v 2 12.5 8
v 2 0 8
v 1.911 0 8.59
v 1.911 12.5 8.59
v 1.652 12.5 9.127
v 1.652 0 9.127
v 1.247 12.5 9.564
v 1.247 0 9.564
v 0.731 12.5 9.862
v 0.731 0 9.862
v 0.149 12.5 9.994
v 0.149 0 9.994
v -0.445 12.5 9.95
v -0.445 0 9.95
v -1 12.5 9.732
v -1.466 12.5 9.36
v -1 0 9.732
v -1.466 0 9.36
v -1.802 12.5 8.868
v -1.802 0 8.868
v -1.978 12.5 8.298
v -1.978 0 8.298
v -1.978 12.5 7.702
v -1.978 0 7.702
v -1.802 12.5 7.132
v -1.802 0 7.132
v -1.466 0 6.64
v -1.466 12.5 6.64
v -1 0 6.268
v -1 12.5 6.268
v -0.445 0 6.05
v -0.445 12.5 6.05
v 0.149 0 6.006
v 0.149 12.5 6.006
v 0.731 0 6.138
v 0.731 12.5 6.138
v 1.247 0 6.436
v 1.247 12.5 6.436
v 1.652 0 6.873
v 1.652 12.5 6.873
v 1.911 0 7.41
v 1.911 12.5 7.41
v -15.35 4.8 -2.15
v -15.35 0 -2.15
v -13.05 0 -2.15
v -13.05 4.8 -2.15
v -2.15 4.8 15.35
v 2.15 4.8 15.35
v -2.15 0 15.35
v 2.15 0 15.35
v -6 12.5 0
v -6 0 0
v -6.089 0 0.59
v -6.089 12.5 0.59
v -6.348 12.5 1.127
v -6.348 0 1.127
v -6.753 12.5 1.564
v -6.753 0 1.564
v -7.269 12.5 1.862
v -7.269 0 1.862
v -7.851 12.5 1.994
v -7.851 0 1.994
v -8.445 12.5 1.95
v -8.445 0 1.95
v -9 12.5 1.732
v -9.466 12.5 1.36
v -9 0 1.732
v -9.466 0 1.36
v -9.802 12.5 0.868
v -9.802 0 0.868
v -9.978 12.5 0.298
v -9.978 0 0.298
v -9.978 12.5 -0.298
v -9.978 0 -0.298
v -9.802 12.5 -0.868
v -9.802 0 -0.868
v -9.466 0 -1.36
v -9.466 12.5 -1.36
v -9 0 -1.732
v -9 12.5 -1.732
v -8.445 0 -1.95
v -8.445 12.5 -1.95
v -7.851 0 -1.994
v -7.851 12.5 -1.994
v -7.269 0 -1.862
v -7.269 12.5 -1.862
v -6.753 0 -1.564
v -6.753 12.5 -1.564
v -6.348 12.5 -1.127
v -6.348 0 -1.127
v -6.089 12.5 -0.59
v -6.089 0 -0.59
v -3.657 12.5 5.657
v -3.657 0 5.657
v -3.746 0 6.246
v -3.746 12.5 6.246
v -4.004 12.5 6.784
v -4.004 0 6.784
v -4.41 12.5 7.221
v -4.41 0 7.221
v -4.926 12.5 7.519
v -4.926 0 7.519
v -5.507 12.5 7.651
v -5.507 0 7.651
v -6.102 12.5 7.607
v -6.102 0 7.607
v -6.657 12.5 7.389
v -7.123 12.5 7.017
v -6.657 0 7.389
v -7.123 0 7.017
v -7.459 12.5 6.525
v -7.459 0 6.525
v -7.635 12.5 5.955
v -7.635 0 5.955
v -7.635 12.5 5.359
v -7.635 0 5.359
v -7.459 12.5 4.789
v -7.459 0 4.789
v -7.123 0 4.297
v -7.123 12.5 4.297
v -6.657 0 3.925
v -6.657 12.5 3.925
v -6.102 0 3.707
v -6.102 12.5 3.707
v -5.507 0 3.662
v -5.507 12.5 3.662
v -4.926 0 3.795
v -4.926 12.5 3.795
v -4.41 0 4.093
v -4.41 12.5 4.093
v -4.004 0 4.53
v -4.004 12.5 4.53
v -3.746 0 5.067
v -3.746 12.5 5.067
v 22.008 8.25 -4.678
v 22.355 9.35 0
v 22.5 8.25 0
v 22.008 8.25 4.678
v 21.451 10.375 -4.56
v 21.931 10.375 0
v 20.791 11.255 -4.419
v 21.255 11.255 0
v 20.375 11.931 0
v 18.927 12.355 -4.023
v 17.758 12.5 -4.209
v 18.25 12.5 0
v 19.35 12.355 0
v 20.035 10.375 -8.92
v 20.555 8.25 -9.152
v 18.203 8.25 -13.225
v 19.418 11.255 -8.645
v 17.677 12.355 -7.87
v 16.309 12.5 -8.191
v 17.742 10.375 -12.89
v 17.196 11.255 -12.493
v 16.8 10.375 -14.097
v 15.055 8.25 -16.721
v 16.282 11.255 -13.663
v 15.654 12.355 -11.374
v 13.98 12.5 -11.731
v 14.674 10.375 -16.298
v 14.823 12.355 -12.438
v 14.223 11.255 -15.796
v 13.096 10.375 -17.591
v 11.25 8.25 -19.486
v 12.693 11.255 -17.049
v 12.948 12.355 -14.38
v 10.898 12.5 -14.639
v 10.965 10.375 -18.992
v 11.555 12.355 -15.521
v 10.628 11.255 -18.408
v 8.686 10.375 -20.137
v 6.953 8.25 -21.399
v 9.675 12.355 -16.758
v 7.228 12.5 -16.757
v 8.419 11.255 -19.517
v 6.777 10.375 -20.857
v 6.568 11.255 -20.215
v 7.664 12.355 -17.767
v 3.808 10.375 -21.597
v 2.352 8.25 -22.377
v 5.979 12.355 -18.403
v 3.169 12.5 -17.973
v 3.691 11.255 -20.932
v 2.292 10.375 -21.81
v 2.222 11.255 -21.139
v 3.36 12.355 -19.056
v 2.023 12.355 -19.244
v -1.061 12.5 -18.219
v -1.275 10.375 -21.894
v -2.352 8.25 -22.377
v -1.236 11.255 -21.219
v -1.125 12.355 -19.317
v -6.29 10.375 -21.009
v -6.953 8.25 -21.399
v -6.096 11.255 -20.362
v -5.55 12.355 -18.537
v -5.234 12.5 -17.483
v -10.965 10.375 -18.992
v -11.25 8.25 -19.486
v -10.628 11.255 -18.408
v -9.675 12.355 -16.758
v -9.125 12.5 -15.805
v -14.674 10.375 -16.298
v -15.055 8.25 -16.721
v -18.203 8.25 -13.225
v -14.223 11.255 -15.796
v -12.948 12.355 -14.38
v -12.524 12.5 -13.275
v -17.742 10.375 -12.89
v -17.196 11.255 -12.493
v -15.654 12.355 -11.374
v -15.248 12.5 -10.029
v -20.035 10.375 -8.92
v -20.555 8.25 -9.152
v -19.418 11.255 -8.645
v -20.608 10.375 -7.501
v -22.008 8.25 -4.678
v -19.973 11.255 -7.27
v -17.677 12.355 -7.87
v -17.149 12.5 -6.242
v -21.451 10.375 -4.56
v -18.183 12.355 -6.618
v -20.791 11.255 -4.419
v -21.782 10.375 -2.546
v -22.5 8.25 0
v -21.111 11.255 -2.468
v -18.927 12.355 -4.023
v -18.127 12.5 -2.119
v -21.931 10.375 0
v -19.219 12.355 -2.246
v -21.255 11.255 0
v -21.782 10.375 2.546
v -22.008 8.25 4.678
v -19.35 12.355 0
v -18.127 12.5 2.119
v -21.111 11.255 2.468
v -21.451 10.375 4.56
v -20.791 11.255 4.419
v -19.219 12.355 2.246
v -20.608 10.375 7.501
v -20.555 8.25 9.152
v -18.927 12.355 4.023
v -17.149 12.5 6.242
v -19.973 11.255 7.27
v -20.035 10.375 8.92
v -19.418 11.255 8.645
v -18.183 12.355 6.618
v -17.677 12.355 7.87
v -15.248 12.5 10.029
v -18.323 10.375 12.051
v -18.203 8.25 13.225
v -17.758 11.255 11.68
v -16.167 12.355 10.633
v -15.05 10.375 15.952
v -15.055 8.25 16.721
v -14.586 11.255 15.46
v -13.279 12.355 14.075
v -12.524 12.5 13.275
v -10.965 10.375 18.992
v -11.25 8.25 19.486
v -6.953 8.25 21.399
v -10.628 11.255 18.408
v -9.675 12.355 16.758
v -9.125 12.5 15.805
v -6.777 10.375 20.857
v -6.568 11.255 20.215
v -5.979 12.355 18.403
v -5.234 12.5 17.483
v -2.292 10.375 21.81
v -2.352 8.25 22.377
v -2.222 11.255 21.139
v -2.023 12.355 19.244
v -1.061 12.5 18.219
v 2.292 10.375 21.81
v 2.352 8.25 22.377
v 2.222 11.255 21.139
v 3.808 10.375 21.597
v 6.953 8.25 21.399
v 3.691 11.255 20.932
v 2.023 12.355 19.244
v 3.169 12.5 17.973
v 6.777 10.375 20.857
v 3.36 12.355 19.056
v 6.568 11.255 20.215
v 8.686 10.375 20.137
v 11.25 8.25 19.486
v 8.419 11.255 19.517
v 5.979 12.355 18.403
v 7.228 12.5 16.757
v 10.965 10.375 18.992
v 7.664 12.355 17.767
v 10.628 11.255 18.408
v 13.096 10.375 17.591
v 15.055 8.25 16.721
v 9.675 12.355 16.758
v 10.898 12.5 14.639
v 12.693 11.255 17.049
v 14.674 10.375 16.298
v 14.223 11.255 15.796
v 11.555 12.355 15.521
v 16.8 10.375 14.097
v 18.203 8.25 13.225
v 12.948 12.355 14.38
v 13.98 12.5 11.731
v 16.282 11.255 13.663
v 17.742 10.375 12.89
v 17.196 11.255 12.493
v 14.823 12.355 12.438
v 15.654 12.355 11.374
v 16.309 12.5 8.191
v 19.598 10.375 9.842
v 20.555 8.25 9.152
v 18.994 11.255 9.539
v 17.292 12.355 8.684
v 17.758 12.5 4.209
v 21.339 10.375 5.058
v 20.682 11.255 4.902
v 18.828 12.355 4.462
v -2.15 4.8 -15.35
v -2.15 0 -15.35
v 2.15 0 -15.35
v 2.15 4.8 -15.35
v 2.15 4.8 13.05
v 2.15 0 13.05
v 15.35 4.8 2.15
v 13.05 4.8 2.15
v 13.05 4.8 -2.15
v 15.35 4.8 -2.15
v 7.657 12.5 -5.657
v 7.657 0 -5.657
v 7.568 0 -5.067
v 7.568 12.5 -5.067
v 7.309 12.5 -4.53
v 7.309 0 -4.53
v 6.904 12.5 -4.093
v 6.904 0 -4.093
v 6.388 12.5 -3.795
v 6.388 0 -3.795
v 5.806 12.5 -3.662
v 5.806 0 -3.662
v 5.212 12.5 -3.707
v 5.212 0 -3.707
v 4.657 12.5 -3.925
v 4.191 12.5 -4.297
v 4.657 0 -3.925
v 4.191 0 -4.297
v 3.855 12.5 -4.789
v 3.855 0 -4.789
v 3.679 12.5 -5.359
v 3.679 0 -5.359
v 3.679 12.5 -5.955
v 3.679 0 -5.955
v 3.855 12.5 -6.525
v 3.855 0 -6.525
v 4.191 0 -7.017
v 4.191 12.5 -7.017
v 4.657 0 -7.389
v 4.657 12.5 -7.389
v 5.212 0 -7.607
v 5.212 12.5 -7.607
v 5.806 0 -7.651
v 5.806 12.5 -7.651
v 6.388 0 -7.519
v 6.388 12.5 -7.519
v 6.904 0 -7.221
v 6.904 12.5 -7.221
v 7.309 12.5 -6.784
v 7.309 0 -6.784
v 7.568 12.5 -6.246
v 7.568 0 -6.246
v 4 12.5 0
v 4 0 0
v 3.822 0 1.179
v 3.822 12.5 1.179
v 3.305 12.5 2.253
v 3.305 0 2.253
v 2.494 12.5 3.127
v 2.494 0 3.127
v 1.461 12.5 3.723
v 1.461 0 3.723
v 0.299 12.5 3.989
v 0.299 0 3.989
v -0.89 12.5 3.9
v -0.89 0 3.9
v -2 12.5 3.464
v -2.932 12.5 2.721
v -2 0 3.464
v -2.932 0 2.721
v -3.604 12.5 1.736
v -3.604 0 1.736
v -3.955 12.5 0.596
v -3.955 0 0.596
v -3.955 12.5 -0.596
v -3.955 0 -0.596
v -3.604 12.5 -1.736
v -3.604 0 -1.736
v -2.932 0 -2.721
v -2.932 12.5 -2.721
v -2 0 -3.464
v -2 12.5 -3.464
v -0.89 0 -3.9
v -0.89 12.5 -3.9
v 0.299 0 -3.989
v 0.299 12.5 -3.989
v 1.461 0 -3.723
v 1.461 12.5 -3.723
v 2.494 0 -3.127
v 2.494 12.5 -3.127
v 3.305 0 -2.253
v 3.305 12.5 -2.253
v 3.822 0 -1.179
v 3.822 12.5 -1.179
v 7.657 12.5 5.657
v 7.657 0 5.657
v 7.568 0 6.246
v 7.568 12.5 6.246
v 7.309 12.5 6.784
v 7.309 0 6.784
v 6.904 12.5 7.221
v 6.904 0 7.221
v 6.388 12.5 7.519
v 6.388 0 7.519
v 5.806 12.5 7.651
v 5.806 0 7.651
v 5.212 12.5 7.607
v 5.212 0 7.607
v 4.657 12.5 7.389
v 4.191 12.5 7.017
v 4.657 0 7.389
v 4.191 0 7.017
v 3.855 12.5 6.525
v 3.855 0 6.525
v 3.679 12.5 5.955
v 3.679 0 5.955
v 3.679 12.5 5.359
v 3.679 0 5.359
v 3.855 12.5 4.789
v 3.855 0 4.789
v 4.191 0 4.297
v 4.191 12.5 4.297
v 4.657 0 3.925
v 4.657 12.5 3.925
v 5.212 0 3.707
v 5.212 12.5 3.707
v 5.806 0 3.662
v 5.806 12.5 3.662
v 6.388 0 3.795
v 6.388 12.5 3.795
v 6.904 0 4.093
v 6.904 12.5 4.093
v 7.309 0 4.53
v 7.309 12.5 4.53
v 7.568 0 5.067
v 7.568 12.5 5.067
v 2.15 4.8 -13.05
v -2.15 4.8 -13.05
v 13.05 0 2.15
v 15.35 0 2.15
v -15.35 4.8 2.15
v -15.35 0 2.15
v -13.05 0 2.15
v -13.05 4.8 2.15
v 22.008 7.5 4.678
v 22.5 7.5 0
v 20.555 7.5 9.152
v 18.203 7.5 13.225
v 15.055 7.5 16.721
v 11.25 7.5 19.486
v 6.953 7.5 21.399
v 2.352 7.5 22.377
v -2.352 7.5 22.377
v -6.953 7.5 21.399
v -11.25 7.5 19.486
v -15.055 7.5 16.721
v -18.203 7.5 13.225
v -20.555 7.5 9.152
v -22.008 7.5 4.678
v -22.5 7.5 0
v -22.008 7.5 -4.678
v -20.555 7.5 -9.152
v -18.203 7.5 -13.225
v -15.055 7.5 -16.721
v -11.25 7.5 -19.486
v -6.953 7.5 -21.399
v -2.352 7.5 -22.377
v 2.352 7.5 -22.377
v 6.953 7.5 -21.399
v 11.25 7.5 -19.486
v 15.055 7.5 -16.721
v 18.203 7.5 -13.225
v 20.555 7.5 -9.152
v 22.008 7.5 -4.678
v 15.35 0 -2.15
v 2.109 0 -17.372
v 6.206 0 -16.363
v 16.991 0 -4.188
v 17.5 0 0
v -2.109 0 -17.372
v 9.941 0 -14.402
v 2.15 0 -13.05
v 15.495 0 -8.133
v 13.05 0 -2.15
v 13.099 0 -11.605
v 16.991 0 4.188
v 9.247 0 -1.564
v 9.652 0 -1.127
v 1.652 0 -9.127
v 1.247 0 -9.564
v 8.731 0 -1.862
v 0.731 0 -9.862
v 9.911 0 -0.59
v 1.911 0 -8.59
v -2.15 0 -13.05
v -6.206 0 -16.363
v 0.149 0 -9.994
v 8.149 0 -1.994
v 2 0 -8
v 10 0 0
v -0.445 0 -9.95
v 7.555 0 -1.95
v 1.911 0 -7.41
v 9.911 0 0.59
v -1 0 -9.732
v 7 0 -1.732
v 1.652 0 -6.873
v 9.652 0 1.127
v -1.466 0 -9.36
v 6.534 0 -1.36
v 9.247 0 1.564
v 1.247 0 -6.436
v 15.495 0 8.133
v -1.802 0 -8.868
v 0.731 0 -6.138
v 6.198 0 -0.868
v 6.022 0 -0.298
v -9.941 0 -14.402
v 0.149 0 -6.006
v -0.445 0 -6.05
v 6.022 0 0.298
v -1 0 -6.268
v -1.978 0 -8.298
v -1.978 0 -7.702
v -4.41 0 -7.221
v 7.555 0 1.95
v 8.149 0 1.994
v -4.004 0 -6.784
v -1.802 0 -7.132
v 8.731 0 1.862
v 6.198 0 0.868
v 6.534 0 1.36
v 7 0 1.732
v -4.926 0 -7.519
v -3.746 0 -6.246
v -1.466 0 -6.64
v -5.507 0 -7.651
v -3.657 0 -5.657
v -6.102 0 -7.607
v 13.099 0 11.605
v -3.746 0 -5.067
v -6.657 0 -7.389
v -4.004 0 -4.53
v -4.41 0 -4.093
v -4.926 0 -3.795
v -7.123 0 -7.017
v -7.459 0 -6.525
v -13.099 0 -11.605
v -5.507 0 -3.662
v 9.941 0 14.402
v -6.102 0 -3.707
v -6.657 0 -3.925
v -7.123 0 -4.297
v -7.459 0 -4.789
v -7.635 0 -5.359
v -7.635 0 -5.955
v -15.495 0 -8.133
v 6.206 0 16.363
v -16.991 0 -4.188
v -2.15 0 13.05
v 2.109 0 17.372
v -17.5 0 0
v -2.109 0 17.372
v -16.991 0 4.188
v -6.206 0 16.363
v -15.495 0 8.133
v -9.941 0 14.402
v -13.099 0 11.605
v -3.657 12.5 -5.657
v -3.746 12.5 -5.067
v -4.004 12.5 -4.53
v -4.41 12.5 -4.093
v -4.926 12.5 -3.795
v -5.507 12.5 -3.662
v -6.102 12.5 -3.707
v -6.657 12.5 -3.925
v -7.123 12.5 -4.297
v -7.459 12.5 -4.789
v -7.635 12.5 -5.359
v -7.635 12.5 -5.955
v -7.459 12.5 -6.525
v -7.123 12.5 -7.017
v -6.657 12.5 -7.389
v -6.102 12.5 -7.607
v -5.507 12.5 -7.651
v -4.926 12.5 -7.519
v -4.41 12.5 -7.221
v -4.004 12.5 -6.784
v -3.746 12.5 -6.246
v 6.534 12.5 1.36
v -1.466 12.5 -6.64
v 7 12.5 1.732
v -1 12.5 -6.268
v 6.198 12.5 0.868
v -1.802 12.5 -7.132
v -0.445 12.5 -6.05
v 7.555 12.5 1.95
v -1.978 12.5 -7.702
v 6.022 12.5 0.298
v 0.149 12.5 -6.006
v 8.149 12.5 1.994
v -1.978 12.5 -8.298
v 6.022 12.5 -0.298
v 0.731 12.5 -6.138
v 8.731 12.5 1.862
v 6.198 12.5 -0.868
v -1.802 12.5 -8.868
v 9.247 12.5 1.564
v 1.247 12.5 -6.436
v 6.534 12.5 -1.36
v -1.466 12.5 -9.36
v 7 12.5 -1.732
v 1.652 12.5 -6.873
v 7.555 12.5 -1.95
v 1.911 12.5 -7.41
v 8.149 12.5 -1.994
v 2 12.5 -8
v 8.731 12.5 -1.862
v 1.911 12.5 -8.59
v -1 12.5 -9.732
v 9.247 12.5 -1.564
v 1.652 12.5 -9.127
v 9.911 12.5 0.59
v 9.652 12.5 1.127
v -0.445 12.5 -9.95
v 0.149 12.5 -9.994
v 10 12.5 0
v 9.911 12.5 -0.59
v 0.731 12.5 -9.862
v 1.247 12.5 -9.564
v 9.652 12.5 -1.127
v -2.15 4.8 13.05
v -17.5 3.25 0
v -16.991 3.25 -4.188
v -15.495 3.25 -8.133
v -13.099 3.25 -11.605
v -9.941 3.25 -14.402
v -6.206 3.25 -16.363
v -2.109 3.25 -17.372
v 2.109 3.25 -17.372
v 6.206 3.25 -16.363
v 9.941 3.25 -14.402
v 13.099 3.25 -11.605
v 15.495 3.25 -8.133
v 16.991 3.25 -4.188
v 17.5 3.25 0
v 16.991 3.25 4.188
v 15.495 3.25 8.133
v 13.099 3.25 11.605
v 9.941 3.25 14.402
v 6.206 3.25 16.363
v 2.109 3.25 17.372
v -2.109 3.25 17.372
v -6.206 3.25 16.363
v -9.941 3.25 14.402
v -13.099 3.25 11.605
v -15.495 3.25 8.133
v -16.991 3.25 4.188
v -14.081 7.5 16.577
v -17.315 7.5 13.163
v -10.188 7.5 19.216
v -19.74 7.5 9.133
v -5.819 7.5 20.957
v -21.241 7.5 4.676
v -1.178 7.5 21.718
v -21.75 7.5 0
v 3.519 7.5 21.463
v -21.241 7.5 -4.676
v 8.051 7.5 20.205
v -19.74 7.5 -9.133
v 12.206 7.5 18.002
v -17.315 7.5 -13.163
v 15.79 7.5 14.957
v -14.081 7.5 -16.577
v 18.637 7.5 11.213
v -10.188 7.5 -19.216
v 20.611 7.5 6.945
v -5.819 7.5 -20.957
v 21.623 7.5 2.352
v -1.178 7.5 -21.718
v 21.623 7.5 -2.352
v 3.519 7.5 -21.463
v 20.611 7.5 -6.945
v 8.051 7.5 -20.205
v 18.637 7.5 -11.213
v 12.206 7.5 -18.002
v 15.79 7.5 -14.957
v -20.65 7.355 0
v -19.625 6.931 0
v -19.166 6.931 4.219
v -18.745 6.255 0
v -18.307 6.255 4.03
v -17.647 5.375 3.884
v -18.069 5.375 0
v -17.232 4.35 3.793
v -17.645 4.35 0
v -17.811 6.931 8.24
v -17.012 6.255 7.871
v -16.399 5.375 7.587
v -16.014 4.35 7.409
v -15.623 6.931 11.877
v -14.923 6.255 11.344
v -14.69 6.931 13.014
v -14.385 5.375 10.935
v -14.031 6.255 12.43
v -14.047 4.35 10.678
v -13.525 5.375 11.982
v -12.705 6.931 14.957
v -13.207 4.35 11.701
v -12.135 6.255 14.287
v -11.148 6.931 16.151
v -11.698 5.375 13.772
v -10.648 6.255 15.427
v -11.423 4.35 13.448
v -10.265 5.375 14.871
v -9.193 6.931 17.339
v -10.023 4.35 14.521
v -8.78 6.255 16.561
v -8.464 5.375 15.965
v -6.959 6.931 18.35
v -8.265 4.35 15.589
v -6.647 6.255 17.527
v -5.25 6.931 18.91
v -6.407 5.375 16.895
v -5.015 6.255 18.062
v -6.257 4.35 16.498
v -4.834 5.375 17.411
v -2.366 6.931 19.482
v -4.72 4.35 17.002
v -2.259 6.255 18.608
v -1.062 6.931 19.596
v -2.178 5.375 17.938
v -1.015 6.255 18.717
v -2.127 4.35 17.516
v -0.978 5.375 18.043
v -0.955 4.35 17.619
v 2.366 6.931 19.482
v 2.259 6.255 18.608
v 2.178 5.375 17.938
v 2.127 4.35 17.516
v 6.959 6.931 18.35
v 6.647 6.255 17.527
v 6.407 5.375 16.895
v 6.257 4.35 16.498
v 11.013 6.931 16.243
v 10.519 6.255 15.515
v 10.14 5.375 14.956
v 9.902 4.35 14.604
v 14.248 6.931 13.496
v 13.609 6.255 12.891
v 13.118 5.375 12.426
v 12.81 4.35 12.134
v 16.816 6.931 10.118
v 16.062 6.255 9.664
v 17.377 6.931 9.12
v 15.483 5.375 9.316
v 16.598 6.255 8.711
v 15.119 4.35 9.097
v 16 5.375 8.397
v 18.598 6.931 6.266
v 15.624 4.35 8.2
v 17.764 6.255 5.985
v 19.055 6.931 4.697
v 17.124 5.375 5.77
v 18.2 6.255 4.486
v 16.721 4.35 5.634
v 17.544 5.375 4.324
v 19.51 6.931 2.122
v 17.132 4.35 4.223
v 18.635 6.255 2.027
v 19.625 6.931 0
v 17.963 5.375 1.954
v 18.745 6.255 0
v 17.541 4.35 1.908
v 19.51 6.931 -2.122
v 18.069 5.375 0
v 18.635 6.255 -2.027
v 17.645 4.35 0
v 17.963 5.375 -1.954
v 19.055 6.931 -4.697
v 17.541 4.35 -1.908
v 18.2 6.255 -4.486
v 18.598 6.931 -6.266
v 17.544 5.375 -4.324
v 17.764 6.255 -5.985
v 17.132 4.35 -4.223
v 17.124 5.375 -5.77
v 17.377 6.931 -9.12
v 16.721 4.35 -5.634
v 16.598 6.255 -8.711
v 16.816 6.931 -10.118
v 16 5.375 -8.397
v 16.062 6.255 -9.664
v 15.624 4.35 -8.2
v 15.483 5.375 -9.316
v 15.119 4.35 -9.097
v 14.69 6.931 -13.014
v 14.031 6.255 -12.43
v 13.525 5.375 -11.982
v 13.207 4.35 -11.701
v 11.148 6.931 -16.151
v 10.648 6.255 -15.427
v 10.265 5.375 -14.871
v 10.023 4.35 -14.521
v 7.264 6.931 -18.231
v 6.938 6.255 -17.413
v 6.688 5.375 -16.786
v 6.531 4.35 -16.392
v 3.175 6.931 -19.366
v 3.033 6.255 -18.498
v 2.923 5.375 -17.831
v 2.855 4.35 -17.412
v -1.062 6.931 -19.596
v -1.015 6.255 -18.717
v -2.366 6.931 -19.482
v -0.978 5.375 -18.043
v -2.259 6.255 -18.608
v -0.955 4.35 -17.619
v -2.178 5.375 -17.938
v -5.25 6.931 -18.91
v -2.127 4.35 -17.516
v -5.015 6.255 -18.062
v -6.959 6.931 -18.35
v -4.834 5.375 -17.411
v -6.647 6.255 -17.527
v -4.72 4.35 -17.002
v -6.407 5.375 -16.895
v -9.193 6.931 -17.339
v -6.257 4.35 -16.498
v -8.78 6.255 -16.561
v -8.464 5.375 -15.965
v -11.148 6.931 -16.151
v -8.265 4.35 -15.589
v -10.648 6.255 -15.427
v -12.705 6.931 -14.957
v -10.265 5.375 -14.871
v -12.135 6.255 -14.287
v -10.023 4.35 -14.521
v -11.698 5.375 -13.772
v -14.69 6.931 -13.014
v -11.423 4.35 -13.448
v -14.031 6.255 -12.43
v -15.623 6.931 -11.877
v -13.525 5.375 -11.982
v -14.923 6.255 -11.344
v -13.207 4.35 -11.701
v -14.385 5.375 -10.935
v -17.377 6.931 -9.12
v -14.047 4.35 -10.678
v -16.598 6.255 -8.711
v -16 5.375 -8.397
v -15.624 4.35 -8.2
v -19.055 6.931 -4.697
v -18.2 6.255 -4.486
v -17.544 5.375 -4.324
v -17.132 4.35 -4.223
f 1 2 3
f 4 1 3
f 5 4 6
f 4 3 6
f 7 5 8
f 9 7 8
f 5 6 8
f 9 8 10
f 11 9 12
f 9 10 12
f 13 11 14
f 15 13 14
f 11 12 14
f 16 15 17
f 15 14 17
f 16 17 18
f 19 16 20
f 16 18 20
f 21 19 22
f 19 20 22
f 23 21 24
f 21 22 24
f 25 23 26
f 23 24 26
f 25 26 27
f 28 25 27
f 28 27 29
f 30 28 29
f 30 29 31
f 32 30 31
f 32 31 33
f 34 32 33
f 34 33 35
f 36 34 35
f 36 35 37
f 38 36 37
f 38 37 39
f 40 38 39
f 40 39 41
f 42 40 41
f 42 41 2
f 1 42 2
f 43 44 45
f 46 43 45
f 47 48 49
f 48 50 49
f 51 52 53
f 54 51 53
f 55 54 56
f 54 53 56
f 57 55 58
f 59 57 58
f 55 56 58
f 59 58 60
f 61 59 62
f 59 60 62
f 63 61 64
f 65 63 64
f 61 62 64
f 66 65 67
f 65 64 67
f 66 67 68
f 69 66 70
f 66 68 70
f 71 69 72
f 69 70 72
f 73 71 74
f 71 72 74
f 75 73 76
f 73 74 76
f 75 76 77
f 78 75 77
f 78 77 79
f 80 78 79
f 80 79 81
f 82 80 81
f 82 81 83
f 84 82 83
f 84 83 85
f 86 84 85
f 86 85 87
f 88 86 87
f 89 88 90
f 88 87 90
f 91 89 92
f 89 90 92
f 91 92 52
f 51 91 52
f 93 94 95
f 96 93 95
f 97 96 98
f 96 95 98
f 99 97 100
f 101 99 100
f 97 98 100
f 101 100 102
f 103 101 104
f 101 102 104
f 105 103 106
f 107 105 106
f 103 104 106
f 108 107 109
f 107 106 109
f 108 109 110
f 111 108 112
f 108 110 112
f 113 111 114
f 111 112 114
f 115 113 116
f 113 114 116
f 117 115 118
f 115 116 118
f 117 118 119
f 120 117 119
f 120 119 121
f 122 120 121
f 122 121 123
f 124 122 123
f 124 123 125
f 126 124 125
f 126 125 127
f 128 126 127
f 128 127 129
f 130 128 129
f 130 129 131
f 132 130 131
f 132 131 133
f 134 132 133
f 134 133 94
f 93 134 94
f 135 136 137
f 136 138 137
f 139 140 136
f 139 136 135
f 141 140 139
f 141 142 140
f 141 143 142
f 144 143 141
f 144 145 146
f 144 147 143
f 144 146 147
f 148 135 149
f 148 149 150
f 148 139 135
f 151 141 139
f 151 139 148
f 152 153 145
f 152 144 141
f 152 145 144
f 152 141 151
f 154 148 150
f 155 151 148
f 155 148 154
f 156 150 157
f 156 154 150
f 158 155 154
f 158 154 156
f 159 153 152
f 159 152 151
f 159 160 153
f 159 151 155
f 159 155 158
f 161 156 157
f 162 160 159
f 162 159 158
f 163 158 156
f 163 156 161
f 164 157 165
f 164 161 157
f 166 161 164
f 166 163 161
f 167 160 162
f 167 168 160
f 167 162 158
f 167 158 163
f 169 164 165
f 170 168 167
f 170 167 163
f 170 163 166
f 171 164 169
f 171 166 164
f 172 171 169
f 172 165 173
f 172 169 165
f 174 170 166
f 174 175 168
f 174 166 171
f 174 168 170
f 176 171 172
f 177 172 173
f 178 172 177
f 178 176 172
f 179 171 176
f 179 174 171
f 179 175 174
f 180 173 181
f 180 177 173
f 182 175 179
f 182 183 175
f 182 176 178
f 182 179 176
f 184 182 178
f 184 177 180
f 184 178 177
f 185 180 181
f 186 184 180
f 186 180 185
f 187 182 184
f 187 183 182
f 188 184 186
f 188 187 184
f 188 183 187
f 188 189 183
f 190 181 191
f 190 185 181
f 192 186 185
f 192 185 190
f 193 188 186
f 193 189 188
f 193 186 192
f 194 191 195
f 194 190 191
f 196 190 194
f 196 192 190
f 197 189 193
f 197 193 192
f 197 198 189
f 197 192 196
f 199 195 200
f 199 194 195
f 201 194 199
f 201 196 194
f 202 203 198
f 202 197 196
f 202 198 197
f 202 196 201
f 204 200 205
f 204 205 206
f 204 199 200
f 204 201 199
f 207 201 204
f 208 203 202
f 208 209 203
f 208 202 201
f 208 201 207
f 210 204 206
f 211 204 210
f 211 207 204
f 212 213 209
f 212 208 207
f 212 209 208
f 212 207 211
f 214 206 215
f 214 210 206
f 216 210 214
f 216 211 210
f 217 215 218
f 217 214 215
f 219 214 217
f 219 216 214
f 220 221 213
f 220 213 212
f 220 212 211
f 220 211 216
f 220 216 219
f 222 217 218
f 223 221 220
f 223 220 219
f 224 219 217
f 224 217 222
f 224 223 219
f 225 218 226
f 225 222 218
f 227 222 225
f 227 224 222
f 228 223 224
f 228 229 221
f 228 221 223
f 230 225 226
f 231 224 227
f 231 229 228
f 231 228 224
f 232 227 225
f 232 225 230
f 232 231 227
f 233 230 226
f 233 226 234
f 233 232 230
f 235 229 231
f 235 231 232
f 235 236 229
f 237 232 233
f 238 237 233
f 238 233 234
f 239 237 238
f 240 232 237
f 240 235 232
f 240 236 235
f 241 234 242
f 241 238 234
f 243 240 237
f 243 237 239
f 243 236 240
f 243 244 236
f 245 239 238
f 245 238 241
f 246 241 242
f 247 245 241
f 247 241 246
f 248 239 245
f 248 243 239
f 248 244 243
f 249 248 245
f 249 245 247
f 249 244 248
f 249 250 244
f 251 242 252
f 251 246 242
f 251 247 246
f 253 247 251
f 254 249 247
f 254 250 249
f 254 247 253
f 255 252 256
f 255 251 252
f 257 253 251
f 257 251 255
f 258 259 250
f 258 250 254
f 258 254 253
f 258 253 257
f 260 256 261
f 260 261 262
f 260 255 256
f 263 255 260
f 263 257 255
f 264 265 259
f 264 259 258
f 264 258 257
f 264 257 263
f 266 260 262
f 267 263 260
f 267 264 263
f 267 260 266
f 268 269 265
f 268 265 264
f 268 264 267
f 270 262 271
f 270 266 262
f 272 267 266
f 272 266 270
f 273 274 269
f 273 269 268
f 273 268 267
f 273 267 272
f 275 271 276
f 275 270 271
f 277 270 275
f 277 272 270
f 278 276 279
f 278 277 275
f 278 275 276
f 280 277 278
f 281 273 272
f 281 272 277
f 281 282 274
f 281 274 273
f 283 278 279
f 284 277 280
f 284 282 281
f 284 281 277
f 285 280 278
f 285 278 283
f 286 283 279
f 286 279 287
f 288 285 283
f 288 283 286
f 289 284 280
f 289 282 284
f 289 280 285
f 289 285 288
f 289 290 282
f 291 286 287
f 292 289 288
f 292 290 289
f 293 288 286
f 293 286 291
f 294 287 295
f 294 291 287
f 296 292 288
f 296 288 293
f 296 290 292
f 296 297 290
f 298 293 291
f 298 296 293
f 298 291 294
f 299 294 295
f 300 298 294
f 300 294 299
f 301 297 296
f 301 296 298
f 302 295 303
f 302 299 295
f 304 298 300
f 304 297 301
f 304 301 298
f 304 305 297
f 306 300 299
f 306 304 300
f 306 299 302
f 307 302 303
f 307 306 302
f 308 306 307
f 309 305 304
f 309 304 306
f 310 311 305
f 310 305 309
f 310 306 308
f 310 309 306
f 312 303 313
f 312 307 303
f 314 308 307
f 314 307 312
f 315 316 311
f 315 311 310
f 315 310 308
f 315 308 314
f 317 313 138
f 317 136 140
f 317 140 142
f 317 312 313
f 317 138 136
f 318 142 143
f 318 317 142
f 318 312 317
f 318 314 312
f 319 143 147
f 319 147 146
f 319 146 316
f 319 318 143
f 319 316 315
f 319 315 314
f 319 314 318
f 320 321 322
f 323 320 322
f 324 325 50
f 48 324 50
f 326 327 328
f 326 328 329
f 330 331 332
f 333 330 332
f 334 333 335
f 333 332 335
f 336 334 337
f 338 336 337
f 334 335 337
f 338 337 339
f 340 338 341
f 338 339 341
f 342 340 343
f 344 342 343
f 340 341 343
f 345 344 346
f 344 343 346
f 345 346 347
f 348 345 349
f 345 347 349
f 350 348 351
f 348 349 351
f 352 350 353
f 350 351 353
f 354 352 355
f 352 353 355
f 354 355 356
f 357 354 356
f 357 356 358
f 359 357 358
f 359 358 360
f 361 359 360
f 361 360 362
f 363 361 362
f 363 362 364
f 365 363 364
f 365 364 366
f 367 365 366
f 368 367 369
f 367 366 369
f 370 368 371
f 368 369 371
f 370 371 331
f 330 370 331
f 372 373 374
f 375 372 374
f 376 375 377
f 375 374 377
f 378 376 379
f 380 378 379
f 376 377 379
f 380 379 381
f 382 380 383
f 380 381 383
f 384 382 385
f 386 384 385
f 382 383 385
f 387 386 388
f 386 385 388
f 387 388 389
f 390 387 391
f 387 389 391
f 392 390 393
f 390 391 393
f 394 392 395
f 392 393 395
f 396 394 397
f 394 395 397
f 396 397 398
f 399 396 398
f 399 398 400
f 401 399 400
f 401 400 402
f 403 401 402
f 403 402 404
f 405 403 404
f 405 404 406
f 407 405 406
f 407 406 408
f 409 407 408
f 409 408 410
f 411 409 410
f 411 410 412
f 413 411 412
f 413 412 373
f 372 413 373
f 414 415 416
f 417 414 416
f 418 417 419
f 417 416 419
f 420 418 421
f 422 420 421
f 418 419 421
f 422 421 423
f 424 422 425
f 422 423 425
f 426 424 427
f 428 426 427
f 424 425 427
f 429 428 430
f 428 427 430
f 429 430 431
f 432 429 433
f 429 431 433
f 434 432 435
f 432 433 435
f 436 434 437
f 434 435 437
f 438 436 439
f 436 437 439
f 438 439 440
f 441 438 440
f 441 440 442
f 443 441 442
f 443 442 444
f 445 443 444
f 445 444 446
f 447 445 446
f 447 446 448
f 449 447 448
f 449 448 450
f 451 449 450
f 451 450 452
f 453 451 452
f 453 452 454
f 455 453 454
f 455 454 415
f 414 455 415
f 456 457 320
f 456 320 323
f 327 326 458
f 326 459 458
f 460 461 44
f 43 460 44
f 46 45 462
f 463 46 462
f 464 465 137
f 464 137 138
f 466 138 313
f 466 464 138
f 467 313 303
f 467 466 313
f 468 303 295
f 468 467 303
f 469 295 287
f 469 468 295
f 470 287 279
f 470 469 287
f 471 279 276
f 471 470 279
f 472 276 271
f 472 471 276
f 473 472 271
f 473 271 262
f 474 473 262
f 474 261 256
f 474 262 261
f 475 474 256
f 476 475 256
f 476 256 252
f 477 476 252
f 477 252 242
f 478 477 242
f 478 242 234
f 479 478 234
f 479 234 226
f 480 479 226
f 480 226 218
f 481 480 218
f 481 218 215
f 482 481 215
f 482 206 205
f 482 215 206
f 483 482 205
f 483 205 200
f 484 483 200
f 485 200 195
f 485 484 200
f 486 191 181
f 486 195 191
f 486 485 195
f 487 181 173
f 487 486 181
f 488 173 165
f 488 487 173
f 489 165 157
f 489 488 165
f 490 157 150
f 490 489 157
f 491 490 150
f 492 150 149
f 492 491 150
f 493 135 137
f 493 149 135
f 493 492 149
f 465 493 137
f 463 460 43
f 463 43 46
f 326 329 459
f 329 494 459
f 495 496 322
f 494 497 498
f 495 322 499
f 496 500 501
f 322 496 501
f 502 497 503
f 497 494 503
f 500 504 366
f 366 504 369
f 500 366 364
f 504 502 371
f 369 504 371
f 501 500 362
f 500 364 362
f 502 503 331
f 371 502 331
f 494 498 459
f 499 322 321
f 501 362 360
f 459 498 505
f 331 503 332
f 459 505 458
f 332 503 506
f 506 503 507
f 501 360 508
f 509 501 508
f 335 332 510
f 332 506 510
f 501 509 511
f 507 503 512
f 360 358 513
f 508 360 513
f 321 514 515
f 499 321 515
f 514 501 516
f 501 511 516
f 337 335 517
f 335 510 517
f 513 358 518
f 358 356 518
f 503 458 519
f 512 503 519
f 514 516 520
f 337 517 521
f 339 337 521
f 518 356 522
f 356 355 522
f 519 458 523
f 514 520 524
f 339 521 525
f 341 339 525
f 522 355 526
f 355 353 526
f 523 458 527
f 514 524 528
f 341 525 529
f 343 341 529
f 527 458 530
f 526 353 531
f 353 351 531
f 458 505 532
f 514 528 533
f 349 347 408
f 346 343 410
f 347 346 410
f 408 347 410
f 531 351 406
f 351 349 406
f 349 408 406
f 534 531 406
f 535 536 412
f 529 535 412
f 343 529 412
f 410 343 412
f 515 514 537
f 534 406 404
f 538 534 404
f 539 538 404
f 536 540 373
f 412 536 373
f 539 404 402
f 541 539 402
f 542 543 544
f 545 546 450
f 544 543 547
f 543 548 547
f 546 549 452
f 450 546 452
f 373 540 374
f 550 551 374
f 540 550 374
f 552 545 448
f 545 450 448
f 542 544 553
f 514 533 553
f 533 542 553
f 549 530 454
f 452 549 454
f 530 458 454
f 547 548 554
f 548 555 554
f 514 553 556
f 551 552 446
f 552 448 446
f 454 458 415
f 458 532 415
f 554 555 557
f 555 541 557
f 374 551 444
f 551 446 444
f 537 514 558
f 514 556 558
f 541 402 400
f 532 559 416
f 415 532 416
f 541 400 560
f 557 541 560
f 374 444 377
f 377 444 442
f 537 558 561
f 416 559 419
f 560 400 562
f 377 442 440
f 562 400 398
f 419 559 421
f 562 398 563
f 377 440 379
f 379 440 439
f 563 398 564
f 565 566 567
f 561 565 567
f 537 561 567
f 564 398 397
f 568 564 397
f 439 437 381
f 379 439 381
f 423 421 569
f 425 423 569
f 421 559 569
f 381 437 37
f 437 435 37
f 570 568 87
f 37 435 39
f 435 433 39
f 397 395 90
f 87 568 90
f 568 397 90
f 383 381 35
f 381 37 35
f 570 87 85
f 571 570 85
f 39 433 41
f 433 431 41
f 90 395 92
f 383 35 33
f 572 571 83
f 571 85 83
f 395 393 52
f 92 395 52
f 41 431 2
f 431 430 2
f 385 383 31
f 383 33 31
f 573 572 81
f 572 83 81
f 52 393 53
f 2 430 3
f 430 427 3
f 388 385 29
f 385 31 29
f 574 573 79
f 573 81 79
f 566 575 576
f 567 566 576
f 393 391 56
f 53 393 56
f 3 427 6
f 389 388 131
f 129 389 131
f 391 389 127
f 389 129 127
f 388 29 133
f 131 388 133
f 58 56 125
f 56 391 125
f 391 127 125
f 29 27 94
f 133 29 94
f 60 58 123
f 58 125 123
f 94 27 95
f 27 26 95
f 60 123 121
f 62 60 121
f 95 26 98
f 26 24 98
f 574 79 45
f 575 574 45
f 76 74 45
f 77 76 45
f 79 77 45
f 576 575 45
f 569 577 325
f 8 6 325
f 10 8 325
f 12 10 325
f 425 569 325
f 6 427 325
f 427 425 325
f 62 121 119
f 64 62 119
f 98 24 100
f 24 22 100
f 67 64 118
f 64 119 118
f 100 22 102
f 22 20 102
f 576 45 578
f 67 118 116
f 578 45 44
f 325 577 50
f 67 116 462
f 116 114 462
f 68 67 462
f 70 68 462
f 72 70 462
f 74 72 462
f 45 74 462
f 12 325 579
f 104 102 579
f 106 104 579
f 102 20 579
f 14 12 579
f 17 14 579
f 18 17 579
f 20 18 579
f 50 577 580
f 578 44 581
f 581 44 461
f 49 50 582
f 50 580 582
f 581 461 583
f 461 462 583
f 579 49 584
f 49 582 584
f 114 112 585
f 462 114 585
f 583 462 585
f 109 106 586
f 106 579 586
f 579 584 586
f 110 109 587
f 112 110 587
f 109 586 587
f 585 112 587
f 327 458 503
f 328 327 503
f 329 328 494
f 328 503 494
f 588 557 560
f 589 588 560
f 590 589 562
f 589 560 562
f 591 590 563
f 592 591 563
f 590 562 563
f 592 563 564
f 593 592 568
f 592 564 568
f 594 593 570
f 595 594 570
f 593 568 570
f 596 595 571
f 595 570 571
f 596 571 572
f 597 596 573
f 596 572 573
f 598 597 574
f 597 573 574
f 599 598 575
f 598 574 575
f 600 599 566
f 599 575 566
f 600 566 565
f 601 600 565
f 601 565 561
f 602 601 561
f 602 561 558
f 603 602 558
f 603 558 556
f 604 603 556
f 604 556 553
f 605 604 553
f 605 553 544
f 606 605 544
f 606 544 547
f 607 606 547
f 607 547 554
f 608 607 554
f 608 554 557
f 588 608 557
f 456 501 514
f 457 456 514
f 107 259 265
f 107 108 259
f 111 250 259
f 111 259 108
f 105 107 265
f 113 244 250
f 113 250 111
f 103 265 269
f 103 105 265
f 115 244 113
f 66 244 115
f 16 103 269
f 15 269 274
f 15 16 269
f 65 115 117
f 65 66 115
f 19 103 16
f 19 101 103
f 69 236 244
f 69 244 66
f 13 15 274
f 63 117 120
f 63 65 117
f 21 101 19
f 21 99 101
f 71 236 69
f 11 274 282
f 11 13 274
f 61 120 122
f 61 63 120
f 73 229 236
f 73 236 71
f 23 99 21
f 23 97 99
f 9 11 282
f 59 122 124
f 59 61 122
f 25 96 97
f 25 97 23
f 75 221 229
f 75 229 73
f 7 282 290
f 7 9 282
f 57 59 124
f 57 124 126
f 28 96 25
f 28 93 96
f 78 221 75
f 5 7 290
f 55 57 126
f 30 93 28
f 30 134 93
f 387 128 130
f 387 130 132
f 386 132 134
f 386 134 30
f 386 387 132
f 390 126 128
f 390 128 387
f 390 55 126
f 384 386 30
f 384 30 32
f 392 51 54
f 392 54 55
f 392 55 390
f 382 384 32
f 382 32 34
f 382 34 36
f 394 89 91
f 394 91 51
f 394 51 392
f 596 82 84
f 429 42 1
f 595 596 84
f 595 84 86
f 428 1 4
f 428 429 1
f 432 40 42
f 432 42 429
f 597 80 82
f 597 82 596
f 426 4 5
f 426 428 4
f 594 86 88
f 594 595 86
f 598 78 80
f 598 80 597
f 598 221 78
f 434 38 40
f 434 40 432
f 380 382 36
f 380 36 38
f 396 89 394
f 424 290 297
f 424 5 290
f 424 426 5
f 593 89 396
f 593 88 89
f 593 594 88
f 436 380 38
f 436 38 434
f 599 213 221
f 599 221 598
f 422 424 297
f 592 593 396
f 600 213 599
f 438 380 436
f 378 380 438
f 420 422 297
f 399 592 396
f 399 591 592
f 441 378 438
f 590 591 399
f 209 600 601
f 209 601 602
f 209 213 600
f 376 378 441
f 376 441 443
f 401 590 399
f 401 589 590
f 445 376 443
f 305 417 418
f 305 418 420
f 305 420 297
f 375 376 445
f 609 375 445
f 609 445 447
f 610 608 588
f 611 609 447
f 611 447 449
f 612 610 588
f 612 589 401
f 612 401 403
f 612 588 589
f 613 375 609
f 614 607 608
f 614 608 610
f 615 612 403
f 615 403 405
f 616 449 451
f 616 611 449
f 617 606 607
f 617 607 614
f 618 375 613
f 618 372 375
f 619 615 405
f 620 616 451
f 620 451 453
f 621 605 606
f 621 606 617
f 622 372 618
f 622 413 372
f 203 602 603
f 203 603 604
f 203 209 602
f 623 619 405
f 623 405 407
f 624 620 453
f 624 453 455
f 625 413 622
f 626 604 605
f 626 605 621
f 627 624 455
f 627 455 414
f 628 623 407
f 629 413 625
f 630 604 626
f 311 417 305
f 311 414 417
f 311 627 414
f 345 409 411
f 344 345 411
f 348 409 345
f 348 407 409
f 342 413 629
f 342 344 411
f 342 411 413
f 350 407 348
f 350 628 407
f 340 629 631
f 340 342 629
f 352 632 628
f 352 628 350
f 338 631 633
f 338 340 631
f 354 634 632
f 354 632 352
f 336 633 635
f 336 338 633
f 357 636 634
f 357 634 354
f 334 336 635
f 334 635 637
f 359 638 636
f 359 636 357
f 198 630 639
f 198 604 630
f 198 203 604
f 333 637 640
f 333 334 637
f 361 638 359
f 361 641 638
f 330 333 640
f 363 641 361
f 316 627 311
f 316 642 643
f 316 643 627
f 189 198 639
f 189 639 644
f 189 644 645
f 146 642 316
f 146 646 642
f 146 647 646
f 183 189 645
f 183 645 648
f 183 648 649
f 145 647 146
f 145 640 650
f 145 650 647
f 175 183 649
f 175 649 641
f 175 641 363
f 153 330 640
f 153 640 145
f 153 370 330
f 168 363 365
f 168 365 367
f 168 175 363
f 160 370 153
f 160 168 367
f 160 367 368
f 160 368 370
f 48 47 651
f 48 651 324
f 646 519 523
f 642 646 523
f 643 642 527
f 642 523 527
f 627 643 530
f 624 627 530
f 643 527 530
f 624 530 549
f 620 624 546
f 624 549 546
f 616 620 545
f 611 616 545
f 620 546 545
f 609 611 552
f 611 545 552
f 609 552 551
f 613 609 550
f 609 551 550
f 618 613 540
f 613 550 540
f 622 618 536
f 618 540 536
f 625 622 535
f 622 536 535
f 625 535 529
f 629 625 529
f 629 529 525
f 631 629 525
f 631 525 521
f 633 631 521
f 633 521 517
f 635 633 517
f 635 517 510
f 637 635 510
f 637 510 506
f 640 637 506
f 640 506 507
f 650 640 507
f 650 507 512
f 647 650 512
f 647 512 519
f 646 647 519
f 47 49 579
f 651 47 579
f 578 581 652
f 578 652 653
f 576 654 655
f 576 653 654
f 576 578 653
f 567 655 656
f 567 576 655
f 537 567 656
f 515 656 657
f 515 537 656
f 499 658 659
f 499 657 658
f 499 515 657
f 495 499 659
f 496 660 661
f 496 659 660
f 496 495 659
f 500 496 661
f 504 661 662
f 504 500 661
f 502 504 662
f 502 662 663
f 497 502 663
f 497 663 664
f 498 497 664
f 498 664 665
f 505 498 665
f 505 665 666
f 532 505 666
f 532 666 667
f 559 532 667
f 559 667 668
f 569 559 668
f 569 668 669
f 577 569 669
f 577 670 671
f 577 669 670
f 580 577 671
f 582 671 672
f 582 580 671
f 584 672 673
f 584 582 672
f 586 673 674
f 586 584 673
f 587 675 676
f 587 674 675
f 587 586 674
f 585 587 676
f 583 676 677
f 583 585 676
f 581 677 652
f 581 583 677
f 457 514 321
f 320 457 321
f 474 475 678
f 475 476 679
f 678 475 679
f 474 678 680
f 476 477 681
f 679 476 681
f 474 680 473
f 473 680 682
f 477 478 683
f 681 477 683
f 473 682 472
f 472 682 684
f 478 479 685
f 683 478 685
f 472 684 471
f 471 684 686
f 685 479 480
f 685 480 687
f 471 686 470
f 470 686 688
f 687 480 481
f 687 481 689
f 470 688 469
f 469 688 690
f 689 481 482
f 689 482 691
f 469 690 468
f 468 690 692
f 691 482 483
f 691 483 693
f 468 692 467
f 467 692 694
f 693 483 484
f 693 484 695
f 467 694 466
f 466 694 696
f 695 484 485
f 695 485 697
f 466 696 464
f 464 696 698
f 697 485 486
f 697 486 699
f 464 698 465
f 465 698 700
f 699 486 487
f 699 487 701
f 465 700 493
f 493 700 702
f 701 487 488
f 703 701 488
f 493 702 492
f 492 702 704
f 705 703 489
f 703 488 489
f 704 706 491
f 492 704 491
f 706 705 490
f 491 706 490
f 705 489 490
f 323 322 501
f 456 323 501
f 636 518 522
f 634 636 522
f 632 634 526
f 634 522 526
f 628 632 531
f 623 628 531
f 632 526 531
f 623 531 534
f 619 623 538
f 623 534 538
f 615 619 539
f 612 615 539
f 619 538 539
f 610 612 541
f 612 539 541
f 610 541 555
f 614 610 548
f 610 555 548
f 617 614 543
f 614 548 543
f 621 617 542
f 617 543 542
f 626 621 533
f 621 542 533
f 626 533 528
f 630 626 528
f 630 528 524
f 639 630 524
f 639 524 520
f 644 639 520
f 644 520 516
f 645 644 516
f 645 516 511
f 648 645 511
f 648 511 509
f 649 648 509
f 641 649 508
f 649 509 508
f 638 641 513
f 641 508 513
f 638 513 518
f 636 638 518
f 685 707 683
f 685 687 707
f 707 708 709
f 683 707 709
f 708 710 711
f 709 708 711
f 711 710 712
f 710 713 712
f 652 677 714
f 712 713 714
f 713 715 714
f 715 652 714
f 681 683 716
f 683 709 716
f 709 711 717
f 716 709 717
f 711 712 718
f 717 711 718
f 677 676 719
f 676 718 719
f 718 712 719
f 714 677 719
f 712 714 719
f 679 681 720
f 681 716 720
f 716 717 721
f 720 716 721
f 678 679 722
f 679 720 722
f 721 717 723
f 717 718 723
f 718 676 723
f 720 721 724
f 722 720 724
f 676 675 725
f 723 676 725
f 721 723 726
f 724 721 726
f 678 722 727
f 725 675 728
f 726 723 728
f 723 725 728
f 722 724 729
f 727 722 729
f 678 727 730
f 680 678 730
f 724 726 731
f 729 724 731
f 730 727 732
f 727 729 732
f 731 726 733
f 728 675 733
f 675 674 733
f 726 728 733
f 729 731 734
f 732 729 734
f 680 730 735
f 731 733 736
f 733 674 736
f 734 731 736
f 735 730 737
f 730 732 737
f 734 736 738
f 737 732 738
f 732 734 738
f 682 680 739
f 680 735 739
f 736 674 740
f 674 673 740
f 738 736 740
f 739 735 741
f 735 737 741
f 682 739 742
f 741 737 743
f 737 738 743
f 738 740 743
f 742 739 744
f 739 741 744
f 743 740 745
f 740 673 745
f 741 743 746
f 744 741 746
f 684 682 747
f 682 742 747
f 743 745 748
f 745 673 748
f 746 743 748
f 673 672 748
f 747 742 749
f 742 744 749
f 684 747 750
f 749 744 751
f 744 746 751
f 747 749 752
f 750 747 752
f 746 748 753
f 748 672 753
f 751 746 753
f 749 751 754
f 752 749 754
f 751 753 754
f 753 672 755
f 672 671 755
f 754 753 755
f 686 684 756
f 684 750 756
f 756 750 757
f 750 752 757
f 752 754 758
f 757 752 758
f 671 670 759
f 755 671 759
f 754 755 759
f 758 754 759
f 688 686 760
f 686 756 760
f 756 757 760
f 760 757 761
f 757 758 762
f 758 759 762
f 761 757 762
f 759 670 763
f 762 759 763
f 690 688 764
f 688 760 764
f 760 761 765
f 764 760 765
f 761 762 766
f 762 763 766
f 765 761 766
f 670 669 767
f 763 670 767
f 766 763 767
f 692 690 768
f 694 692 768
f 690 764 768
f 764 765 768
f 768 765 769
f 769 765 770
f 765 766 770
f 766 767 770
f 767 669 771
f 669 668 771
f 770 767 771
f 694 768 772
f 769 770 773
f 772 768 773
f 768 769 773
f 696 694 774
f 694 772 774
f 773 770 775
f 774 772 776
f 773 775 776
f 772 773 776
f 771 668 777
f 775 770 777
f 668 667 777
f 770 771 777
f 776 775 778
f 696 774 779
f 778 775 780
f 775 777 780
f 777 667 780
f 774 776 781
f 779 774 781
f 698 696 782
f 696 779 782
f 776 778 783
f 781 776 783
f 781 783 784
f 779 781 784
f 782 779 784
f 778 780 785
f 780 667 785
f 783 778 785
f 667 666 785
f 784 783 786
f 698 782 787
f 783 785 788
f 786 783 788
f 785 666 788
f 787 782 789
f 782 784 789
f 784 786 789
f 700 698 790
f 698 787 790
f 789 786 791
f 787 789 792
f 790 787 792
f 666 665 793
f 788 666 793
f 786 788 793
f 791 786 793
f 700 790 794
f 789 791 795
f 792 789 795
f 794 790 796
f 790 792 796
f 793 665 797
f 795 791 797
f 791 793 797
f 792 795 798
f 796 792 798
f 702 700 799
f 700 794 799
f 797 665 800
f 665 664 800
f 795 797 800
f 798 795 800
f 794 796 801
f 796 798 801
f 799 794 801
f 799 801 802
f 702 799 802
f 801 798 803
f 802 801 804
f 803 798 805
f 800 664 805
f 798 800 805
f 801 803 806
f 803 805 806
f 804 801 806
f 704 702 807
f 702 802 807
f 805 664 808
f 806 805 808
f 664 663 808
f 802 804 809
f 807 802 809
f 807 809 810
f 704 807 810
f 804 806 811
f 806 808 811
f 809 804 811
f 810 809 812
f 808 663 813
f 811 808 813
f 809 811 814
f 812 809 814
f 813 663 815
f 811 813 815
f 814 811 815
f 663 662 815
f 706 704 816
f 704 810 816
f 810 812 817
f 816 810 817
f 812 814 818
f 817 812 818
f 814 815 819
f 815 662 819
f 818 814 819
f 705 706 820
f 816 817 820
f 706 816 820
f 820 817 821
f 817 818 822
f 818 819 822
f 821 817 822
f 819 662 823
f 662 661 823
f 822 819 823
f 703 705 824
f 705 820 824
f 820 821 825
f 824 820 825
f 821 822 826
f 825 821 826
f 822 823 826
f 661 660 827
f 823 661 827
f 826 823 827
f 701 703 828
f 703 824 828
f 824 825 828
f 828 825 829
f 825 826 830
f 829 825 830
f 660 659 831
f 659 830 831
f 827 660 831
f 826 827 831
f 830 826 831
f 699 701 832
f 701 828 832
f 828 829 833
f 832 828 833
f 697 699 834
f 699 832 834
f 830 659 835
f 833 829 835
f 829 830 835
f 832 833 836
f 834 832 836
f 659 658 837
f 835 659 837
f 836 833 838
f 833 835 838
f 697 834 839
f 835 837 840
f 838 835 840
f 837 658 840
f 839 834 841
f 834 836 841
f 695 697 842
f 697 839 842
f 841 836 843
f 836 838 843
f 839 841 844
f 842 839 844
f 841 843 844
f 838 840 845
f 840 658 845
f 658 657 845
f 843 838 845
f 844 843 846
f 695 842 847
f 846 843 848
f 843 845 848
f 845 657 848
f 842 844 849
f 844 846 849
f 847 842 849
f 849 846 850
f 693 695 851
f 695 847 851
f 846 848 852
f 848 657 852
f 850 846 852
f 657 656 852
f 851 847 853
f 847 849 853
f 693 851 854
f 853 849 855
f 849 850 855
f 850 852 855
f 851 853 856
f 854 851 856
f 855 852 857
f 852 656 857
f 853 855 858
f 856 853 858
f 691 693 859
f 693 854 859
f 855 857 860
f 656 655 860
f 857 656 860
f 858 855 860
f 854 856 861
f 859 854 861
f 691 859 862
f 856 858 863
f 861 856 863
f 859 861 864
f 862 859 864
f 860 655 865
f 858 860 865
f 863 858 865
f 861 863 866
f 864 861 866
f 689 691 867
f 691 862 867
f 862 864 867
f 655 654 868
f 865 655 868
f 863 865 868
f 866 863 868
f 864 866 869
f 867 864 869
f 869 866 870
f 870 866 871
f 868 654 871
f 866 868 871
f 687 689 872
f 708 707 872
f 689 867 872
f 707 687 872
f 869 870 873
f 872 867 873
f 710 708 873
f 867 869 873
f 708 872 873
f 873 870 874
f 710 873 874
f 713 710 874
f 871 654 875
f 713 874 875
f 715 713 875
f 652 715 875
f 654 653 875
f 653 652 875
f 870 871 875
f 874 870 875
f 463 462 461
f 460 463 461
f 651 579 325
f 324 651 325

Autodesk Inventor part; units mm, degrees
ref_plane "YZ Plane" through (0, 0, 0) normal (1, 0, 0) x (0, 1, 0)
ref_plane "XZ Plane" through (0, 0, 0) normal (0, 1, 0) x (-1, 0, 0)
ref_plane "XY Plane" through (0, 0, 0) normal (0, 0, 1) x (1, 0, 0)
sketch "Эскиз1" plane through (0, 0, 0) normal (0, 1, 0) x (-1, 0, 0)
  circle A0 centre (0, 0) radius 17.5
  dimension "d0" = 35
extrude "Выдавливание1" add sketch "Эскиз1" along normal blind 7.5
sketch "Эскиз2" plane through (0, 7.5, 0) normal (0, 1, 0) x (1, 0, 0)
  circle A0 centre (0, 0) radius 22.5
  dimension "d3" = 45
extrude "Выдавливание2" add sketch "Эскиз2" along normal blind 5
fillet "Сопряжение1" radius 4.25 1 edges at (17.5, 7.5, 0)
fillet "Сопряжение2" radius 4.25 1 edges at (-22.5, 12.5, 0)
sketch "Эскиз3" plane through (0, 0, 0) normal (0, -1, 0) x (1, 0, 0)
  line L0 (-24.85, 5.95) -> (-15.15, 5.95)
  line L1 (-15.15, 5.95) -> (-15.15, -5.95)
  line L2 (-15.15, -5.95) -> (-24.85, -5.95)
  line L3 (-24.85, -5.95) -> (-24.85, 5.95)
  line L4 (-4.7, 15.3) -> (-4.7, 25)
  line L5 (-4.7, 25) -> (5, 25)
  line L6 (5, 25) -> (5, 15.3)
  line L7 (5, 15.3) -> (-4.7, 15.3)
  line L8 (5, -15.3) -> (5, -25)
  line L9 (5, -25) -> (-4.7, -25)
  line L10 (-4.7, -25) -> (-4.7, -15.3)
  line L11 (-4.7, -15.3) -> (5, -15.3)
  line L12 (15.15, 5.95) -> (24.85, 5.95)
  line L13 (24.85, 5.95) -> (24.85, -5.95)
  line L14 (24.85, -5.95) -> (15.15, -5.95)
  line L15 (15.15, -5.95) -> (15.15, 5.95)
  circle A0 centre (0, 8) radius 2
  circle A1 centre (-5.6569, -5.6569) radius 2
  circle A2 centre (0, -8) radius 2
  circle A3 centre (0, 0) radius 4
  circle A4 centre (8, 0) radius 2
  circle A5 centre (-8, 0) radius 2
  circle A6 centre (5.6569, -5.6569) radius 2
  circle A7 centre (-5.6569, 5.6569) radius 2
  circle A8 centre (5.6569, 5.6569) radius 2
  circle A9 centre (0, 0) radius 35
extrude "Выдавливание3" cut sketch "Эскиз3" against normal through all contours A0 | A1 | A2 | A3 | A4 | A5 | A6 | A7 | A8
sketch "Эскиз4" plane through (0, 0, 0) normal (0, -1, 0) x (1, 0, 0)
  circle A0 centre (-8, 0) radius 2 projected
  line L0 (-8, 0) -> (-13.2, 0)
  line L1 (-13.2, 0) -> (-13.2, -2)
  line L2 (-13.2, -2) -> (-15.2, -2)
  line L3 (-15.2, -2) -> (-15.2, 2)
  line L4 (-15.2, 2) -> (-13.2, 2)
  line L5 (-13.2, 2) -> (-13.2, 0)
  line L6 (2, -15.2) -> (-2, -15.2)
  line L7 (2, -13.2) -> (2, -15.2)
  line L8 (-2, -13.2) -> (0, -13.2)
  line L9 (0, -13.2) -> (2, -13.2)
  line L10 (-2, -15.2) -> (-2, -13.2)
  line L11 (15.2, 2) -> (15.2, -2)
  line L12 (13.2, 2) -> (15.2, 2)
  line L13 (13.2, -2) -> (13.2, 0)
  line L14 (13.2, 0) -> (13.2, 2)
  line L15 (15.2, -2) -> (13.2, -2)
  line L16 (-2, 15.2) -> (2, 15.2)
  line L17 (-2, 13.2) -> (-2, 15.2)
  line L18 (2, 13.2) -> (0, 13.2)
  line L19 (0, 13.2) -> (-2, 13.2)
  line L20 (2, 15.2) -> (2, 13.2)
  point P0 (0, 0)
  dimension "d10" = 5.2
  dimension "d11" = 2
  dimension "d12" = 4
  dimension "d15" = 360
extrude "Выдавливание4" add sketch "Эскиз4" along normal blind 4.5 contours L1 L2 L3 L4 L5 | L6 L10 L8 L9 L7 | L11 L15 L13 L14 L12 | L16 L20 L18 L19 L17
sketch "Эскиз6" plane through (0, 0, 0) normal (0, -1, 0) x (1, 0, 0)
  circle A0 centre (0, 0) radius 17.5 projected
  point P0 (0, 17.5)
ref_plane "РабПлоскость1" through (0, 0, 17.5) normal (0, 0, 1) x (1, 0, 0)
sketch "Эскиз8" plane through (0, -4.5, 0) normal (0, -1, 0) x (1, 0, 0)
  line L0 (13.2, 2) -> (13.2, -2) projected
  line L1 (13.2, -2) -> (15.2, -2) projected
  line L2 (15.2, -2) -> (15.2, 2) projected
  line L3 (15.2, 2) -> (13.2, 2) projected
  line L4 (13.05, -2.15) -> (15.35, -2.15)
  line L5 (15.35, -2.15) -> (15.35, 2.15)
  line L6 (15.35, 2.15) -> (13.05, 2.15)
  line L7 (13.05, 2.15) -> (13.05, -2.15)
  line L8 (13.05, -2.15) -> (15.35, 2.15) construction
  line L9 (15.35, -2.15) -> (13.05, 2.15) construction
  line L10 (-2.15, 15.35) -> (-2.15, 13.05)
  line L11 (2.15, 15.35) -> (-2.15, 15.35)
  line L12 (2.15, 13.05) -> (2.15, 15.35)
  line L13 (-2.15, 13.05) -> (2.15, 13.05)
  line L14 (-15.35, -2.15) -> (-13.05, -2.15)
  line L15 (-15.35, 2.15) -> (-15.35, -2.15)
  line L16 (-13.05, 2.15) -> (-15.35, 2.15)
  line L17 (-13.05, -2.15) -> (-13.05, 2.15)
  line L18 (2.15, -15.35) -> (2.15, -13.05)
  line L19 (-2.15, -15.35) -> (2.15, -15.35)
  line L20 (-2.15, -13.05) -> (-2.15, -15.35)
  line L21 (2.15, -13.05) -> (-2.15, -13.05)
  point P0 (0, 0)
  point P1 (14.2, 0)
  dimension "d24" = 2.3
  dimension "d25" = 4.3
  dimension "d28" = 360
extrude "Выдавливание6" cut sketch "Эскиз8" against normal blind 9.3 contours L3 L2 L1 L0 | L7 L6 L5 L4 | L11 L12 L13 L10 | L15 L16 L17 L14 | L19 L20 L21 L18
properties part number "мини катушка 2"
